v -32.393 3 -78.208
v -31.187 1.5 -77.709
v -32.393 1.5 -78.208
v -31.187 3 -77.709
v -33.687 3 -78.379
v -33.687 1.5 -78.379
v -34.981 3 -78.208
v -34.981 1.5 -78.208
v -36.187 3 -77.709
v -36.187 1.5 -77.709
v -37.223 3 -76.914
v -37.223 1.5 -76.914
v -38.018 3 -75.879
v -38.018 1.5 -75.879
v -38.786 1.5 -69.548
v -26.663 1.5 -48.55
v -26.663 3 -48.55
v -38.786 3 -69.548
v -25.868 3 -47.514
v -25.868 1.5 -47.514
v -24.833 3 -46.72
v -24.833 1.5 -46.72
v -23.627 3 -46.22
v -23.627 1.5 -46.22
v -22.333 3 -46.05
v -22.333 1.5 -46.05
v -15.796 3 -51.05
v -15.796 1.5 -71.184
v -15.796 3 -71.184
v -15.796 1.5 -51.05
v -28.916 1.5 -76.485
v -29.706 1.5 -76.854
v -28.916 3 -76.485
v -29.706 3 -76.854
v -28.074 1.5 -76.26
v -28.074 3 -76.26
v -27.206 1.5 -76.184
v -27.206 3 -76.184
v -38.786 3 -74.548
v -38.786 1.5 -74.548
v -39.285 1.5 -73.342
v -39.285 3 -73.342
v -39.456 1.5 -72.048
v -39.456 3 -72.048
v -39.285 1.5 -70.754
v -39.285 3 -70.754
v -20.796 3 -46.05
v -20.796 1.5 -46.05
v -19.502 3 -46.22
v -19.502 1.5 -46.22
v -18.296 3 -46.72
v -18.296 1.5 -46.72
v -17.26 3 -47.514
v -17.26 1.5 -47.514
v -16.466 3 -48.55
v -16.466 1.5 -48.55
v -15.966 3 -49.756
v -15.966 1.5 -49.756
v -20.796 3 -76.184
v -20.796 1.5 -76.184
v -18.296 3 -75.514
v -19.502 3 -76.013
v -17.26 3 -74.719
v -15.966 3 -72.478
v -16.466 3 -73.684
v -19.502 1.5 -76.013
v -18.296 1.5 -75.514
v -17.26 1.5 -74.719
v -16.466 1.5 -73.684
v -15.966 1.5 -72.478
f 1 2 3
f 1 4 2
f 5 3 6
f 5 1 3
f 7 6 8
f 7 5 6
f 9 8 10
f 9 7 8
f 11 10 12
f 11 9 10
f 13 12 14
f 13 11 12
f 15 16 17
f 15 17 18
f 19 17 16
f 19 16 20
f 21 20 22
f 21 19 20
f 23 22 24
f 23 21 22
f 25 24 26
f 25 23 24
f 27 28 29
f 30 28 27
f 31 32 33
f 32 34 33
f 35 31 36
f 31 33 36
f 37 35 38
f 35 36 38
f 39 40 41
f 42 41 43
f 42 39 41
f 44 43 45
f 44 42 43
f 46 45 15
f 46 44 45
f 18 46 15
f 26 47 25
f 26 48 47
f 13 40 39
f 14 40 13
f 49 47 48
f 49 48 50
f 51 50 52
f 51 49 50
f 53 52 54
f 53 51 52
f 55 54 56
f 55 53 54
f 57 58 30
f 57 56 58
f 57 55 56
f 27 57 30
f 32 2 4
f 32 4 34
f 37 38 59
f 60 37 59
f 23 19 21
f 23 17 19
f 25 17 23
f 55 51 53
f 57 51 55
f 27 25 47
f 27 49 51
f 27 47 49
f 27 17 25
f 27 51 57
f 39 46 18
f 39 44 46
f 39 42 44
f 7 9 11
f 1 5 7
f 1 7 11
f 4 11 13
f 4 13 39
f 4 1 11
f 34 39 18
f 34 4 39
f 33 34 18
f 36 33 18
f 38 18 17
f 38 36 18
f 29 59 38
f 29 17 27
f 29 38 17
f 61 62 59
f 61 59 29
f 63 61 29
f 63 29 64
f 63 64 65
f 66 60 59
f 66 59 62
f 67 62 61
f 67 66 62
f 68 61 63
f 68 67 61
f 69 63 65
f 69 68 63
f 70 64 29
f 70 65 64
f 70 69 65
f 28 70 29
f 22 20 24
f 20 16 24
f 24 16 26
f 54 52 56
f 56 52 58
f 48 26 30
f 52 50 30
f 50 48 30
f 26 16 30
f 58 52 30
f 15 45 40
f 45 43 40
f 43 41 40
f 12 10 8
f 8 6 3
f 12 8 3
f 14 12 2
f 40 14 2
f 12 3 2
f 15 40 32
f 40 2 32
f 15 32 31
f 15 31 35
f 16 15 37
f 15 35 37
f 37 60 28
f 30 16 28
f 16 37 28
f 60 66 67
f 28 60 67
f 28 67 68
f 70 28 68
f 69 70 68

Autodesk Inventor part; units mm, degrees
ref_plane "YZ Plane" through (0, 0, 0) normal (1, 0, 0) x (0, 1, 0)
ref_plane "XZ Plane" through (0, 0, 0) normal (0, 1, 0) x (-1, 0, 0)
ref_plane "XY Plane" through (0, 0, 0) normal (0, 0, 1) x (1, 0, 0)
sketch "スケッチ1" plane through (0, 0, 0) normal (0, 1, 0) x (-1, 0, 0)
  line L0 (75, 0) -> (105, -51.9615)
  line L1 (-75, 0) -> (-105, -51.9615)
  line L2 (0, -218.2384) -> (0, 36.3731)
  line L3 (147, 0) -> (-147, 0)
  line L4 (37.5, -27) -> (-37.5, -27)
  line L5 (105, -51.9615) -> (30, -181.8653)
  line L6 (30, -181.8653) -> (-30, -181.8653)
  line L7 (-30, -181.8653) -> (-105, -51.9615)
  line L8 (75, 0) -> (-75, 0)
  line L9 (-25.3673, -135.8894) -> (-62.8673, -70.9375)
  line L10 (25.3673, -135.8894) -> (62.8673, -70.9375)
  line L11 (-37.5, -27) -> (-27.5, -27)
  line L12 (-27.5, -27) -> (-27.5, -39)
  line L13 (-27.5, -39) -> (-37.5, -39)
  line L14 (-37.5, -39) -> (-37.5, -27)
  line L15 (37.5, -27) -> (27.5, -27)
  line L16 (27.5, -27) -> (27.5, -39)
  line L17 (27.5, -39) -> (37.5, -39)
  line L18 (37.5, -39) -> (37.5, -27)
  line L19 (0, -77.9423) -> (44.1173, -103.4134) construction
  line L20 (0, -77.9423) -> (-44.1173, -103.4134) construction
  line L21 (-44.1173, -103.4134) -> (-67.5, -116.9134) construction
  line L22 (-57.8673, -79.5977) -> (-47.475, -73.5977)
  line L23 (-52.475, -64.9375) -> (-62.8673, -70.9375)
  line L24 (-62.8673, -70.9375) -> (-57.8673, -79.5977)
  line L25 (-47.475, -73.5977) -> (-52.475, -64.9375)
  line L26 (-25.3673, -135.8894) -> (-30.3673, -127.2291)
  line L27 (-19.975, -121.2291) -> (-14.975, -129.8894)
  line L28 (-14.975, -129.8894) -> (-25.3673, -135.8894)
  line L29 (-30.3673, -127.2291) -> (-19.975, -121.2291)
  line L30 (30.3673, -127.2291) -> (19.975, -121.2291)
  line L31 (14.975, -129.8894) -> (25.3673, -135.8894)
  line L32 (25.3673, -135.8894) -> (30.3673, -127.2291)
  line L33 (19.975, -121.2291) -> (14.975, -129.8894)
  line L34 (62.8673, -70.9375) -> (57.8673, -79.5977)
  line L35 (47.475, -73.5977) -> (52.475, -64.9375)
  line L36 (52.475, -64.9375) -> (62.8673, -70.9375)
  line L37 (57.8673, -79.5977) -> (47.475, -73.5977)
  line L38 (62.8673, -70.9375) -> (37.5, -27)
  line L39 (-37.5, -27) -> (-62.8673, -70.9375)
  line L40 (-25.3673, -135.8894) -> (25.3673, -135.8894)
  line L41 (-25.3673, -135.8894) -> (-25.3673, -181.8653)
  line L42 (25.3673, -135.8894) -> (25.3673, -181.8653)
  line L43 (-25.3673, -135.8894) -> (-48.75, -149.3894)
  line L44 (25.3673, -135.8894) -> (48.75, -149.3894)
  point P0 (0, 0)
  point P1 (0, 0)
  point P2 (0, -27)
  dimension "d1" = 150
  dimension "d2" = 60
  dimension "d3" = 60
  dimension "d4" = 27
  dimension "d5" = 75
  dimension "d6" = 60
  dimension "d7" = 27
  dimension "d8" = 10
  dimension "d9" = 12
  dimension "d10" = 10
  dimension "d11" = 12
  dimension "d14" = 360
extrude "プレート1" add sketch "スケッチ1" along normal blind 1.5 contours L5 L6 L42 L44 | L4 L16 L17 L18 L38 L36 L35 L37 L10 L30 L33 L31 L40 L2 | L2 L40 L28 L27 L29 L9 L22 L25 L23 L39 L14 L13 L12 L4 | L31 L33 L30 L10 | L42 L6 L2 L40 | L2 L6 L41 L40 | L4 L18 L17 L16 | L12 L13 L14 L4 | L9 L29 L27 L28 | L41 L6 L7 L43 | L37 L35 L36 L10 | L23 L25 L22 L9
sketch "スケッチ2" plane through (0, 0, 0) normal (0, -1, 0) x (1, 0, 0)
  line L0 (23.3798, -38.55) -> (-23.3798, -38.55) projected
  line L1 (8.2, -46.6) -> (-8.2, -46.6) projected
  arc A0 (-21.1, -27) -> (-23.3798, -38.55) centre (-21.1, -33) ccw projected
  line L2 (-27.5, -27) -> (-27.5, -39) projected
  line L3 (27.5, -39) -> (27.5, -27) projected
  line L4 (-27.5, -39) -> (-27.5, -40.55)
  line L5 (-27.5, -40.55) -> (-10.2, -40.55)
  line L6 (-10.2, -40.55) -> (-10.2, -48.6)
  line L7 (-10.2, -48.6) -> (10.2, -48.6)
  line L8 (10.2, -48.6) -> (10.2, -40.55)
  line L9 (10.2, -40.55) -> (27.5, -40.55)
  line L10 (27.5, -40.55) -> (27.5, -39)
  line L11 (-37.5, -27) -> (-27.5, -27) projected
  line L12 (-37.5, -27) -> (37.5, -27) projected
  line L13 (-20.3112, -101.4469) -> (-30.5112, -83.78)
  line L14 (-27.2827, -105.4719) -> (-20.3112, -101.4469)
  line L15 (-18.6327, -120.4541) -> (-27.2827, -105.4719)
  line L16 (-19.975, -121.2291) -> (-18.6327, -120.4541)
  line L17 (-37.4827, -87.805) -> (-46.1327, -72.8227)
  line L18 (-46.1327, -72.8227) -> (-47.475, -73.5977)
  line L19 (-30.5112, -83.78) -> (-37.4827, -87.805)
  line L20 (30.5112, -83.78) -> (20.3112, -101.4469)
  line L21 (37.4827, -87.805) -> (30.5112, -83.78)
  line L22 (46.1327, -72.8227) -> (37.4827, -87.805)
  line L23 (47.475, -73.5977) -> (46.1327, -72.8227)
  line L24 (27.2827, -105.4719) -> (18.6327, -120.4541)
  line L25 (18.6327, -120.4541) -> (19.975, -121.2291)
  line L26 (20.3112, -101.4469) -> (27.2827, -105.4719)
  line L27 (-47.475, -73.5977) -> (-57.8673, -79.5977)
  line L28 (-57.8673, -79.5977) -> (-30.3673, -127.2291)
  line L29 (-30.3673, -127.2291) -> (-19.975, -121.2291)
  line L30 (19.975, -121.2291) -> (30.3673, -127.2291)
  line L31 (30.3673, -127.2291) -> (57.8673, -79.5977)
  line L32 (57.8673, -79.5977) -> (47.475, -73.5977)
  point P0 (0, 0)
  point P1 (0, -77.9423)
  point P2 (-23.0432, -100.7148)
  point P3 (-33.5673, -121.6866)
  point P4 (-22.4248, -117.8859)
  point P5 (-25.3673, -135.8894)
  point P6 (-28.3712, -118.6866)
  point P7 (-31.2432, -86.512)
  point P8 (-45.8046, -77.3909)
  point P9 (-62.8673, -70.9375)
  point P10 (31.2432, -86.512)
  point P11 (54.6673, -85.1403)
  point P12 (45.8046, -77.3909)
  point P13 (62.8673, -70.9375)
  point P14 (49.4712, -82.1403)
  point P15 (23.0432, -100.7148)
  point P16 (22.4248, -117.8859)
  point P17 (25.3673, -135.8894)
  dimension "d17" = 2
  dimension "d18" = 2
  dimension "d19" = 2
  dimension "d20" = 2
  dimension "d26" = 360
extrude "切り取り1" cut sketch "スケッチ2" against normal blind 1.5
fillet "フィレット1" radius 1.5 18 edges at (-10.2, 0.75, -48.6) (-10.2, 0.75, -40.55) (-27.5, 0.75, -40.55) (10.2, 0.75, -48.6) (10.2, 0.75, -40.55) (27.5, 0.75, -40.55) (-30.5112, 0.75, -83.78) (-46.1327, 0.75, -72.8227) (-20.3112, 0.75, -101.4469) (-27.2827, 0.75, -105.4719) (-37.4827, 0.75, -87.805) (-18.6327, 0.75, -120.4541) (20.3112, 0.75, -101.4469) (27.2827, 0.75, -105.4719) (18.6327, 0.75, -120.4541) (30.5112, 0.75, -83.78) (37.4827, 0.75, -87.805) (46.1327, 0.75, -72.8227)
sketch "スケッチ3" plane through (0, 0, 0) normal (0, -1, 0) x (1, 0, 0)
  circle A0 centre (40.9875, -45.0405) radius 1.6 projected
  circle A1 centre (48.9875, -58.8969) radius 1.6 projected
  circle A2 centre (8, -129.8894) radius 1.6 projected
  circle A3 centre (-8, -129.8894) radius 1.6 projected
  circle A4 centre (-48.9875, -58.8969) radius 1.6 projected
  circle A5 centre (-40.9875, -45.0405) radius 1.6 projected
  point P0 (0, 0)
extrude "切り取り2" cut sketch "スケッチ3" against normal blind 1.5
sketch "スケッチ4" plane through (0, 0, 0) normal (0, -1, 0) x (1, 0, 0)
  circle A0 centre (10, -176.8653) radius 1.35 projected
  circle A1 centre (21.2333, -145.0496) radius 1.6 projected
  circle A2 centre (10, -143.8894) radius 1.6 projected
  line L0 (52.75, -142.4612) -> (30, -181.8653) projected
  line L1 (52.75, -142.4612) -> (33.6974, -131.4612) projected
  line L2 (33.6974, -131.4612) -> (27.1974, -142.7195) projected
  line L3 (27.1974, -142.7195) -> (20.5635, -138.8894) projected
  line L4 (20.5635, -138.8894) -> (5, -138.8894) projected
  line L5 (5, -138.8894) -> (5, -181.8653) projected
  line L6 (30, -181.8653) -> (5, -181.8653) projected
  circle A3 centre (-10, -176.8653) radius 1.35 projected
  circle A4 centre (-21.2333, -145.0496) radius 1.6 projected
  circle A5 centre (-10, -143.8894) radius 1.6 projected
  line L7 (-12.9295, -171.4323) -> (-35.4295, -132.4612) projected
  line L8 (-30.25, -181.4323) -> (-12.9295, -171.4323) projected
  line L9 (-30, -181.8653) -> (-30.25, -181.4323) projected
  line L10 (-30, -181.8653) -> (-5, -181.8653) projected
  line L11 (-5, -181.8653) -> (-5, -138.8894) projected
  line L12 (-5, -138.8894) -> (-20.5635, -138.8894) projected
  line L13 (-20.5635, -138.8894) -> (-27.1974, -142.7195) projected
  line L14 (-33.6974, -131.4612) -> (-27.1974, -142.7195) projected
  line L15 (-35.4295, -132.4612) -> (-33.6974, -131.4612) projected
  point P0 (0, 0)
extrude "切り取り3" cut sketch "スケッチ4" against normal blind 1.5 contours A0 | A1 | A2 | A3 | A4 | A5
sketch "スケッチ5" plane through (0, 1.5, 0) normal (0, 1, 0) x (1, 0, 0)
  line L0 (-19.975, 121.2291) -> (19.975, 121.2291) projected
  line L1 (47.475, 73.5977) -> (27.5, 39) projected
  line L2 (-47.475, 73.5977) -> (-27.5, 39) projected
  point P0 (0, 0)
sketch "スケッチ6" plane through (0, 1.5, 0) normal (0, 1, 0) x (1, 0, 0)
  line L0 (-26.0855, 44.55) -> (-41.9613, 72.0477)
  line L1 (-41.9613, 72.0477) -> (-36.0186, 82.3409)
  line L2 (-36.0186, 82.3409) -> (-29.0471, 78.3159)
  line L3 (-29.0471, 78.3159) -> (-14.8471, 102.911)
  line L4 (-14.8471, 102.911) -> (-21.8186, 106.936)
  line L5 (-21.8186, 106.936) -> (-15.8758, 117.2291)
  line L6 (-15.8758, 117.2291) -> (15.8758, 117.2291)
  line L7 (15.8758, 117.2291) -> (21.8186, 106.936)
  line L8 (21.8186, 106.936) -> (14.8471, 102.911)
  line L9 (14.8471, 102.911) -> (29.0471, 78.3159)
  line L10 (29.0471, 78.3159) -> (36.0186, 82.3409)
  line L11 (36.0186, 82.3409) -> (41.9613, 72.0477)
  line L12 (41.9613, 72.0477) -> (26.0855, 44.55)
  line L13 (26.0855, 44.55) -> (14.2, 44.55)
  line L14 (14.2, 44.55) -> (14.2, 52.6)
  line L15 (14.2, 52.6) -> (-14.2, 52.6)
  line L16 (-14.2, 52.6) -> (-14.2, 44.55)
  line L17 (-14.2, 44.55) -> (-26.0855, 44.55)
  line L18 (-47.475, 73.5977) -> (-27.5, 39) projected
  line L19 (-38.2327, 86.5059) -> (-45.3827, 74.1218) projected
  line L20 (-31.8102, 84.53) -> (-36.1836, 87.055) projected
  line L21 (-21.0612, 100.1479) -> (-29.7612, 85.079) projected
  line L22 (-25.9836, 104.7219) -> (-21.6102, 102.1969) projected
  line L23 (-19.3827, 119.1551) -> (-26.5327, 106.7709) projected
  line L24 (-19.975, 121.2291) -> (19.975, 121.2291) projected
  line L25 (47.475, 73.5977) -> (27.5, 39) projected
  line L26 (26.5327, 106.7709) -> (19.3827, 119.1551) projected
  line L27 (21.6102, 102.1969) -> (25.9836, 104.7219) projected
  line L28 (29.7612, 85.079) -> (21.0612, 100.1479) projected
  line L29 (36.1836, 87.055) -> (31.8102, 84.53) projected
  line L30 (45.3827, 74.1218) -> (38.2327, 86.5059) projected
  line L31 (11.7, 40.55) -> (26, 40.55) projected
  line L32 (10.2, 47.1) -> (10.2, 42.05) projected
  line L33 (-8.7, 48.6) -> (8.7, 48.6) projected
  line L34 (-10.2, 42.05) -> (-10.2, 47.1) projected
  line L35 (-26, 40.55) -> (-11.7, 40.55) projected
  line L36 (0, 48.6) -> (0, 121.2291)
  line L37 (-25.4112, 92.6134) -> (-31.0836, 95.8884) construction
  point P0 (0, 0)
  dimension "d32" = 4
  dimension "d33" = 4
  dimension "d34" = 4
  dimension "d35" = 4
  dimension "d36" = 4
  dimension "d37" = 4
  dimension "d38" = 4
  dimension "d39" = 4
  dimension "d40" = 4
extrude "切り取り4" cut sketch "スケッチ6" against normal blind 1.5
fillet "フィレット2" radius 5 9 edges at (-14.2, 0.75, -44.55) (-26.0855, 0.75, -44.55) (-41.9613, 0.75, -72.0477) (-36.0186, 0.75, -82.3409) (-21.8186, 0.75, -106.936) (-15.8758, 0.75, -117.2291) (-14.2, 0.75, -52.6) (-29.0471, 0.75, -78.3159) (-14.8471, 0.75, -102.911)
mirror "ミラー1" about plane through (0, 0, 0) normal (1, 0, 0) of "フィレット2"
sketch "スケッチ7" plane through (0, 1.5, 0) normal (0, 1, 0) x (1, 0, 0)
  arc A0 (18.2848, 105.0066) -> (17.2511, 98.7471) centre (21.5812, 101.2471) ccw projected
  line L0 (17.2511, 98.7471) -> (26.643, 82.4797) projected
  arc A1 (26.643, 82.4797) -> (32.5808, 80.2452) centre (30.9732, 84.9797) ccw projected
  arc A2 (38.5186, 78.0107) -> (32.5808, 80.2452) centre (34.1884, 75.5107) ccw projected
  line L1 (38.5186, 78.0107) -> (40.5179, 74.5477) projected
  arc A3 (40.5179, 69.5477) -> (40.5179, 74.5477) centre (36.1878, 72.0477) ccw projected
  line L2 (40.5179, 69.5477) -> (27.5289, 47.05) projected
  arc A4 (23.1987, 44.55) -> (27.5289, 47.05) centre (23.1987, 49.55) ccw projected
  line L3 (23.1987, 44.55) -> (19.2, 44.55) projected
  arc A5 (14.296, 48.575) -> (19.2, 44.55) centre (19.2, 49.55) ccw projected
  arc A6 (14.296, 48.575) -> (9.392, 52.6) centre (9.392, 47.6) ccw projected
  line L4 (9.392, 52.6) -> (-9.392, 52.6) projected
  arc A7 (-9.392, 52.6) -> (-14.296, 48.575) centre (-9.392, 47.6) ccw projected
  arc A8 (-19.2, 44.55) -> (-14.296, 48.575) centre (-19.2, 49.55) ccw projected
  line L5 (-19.2, 44.55) -> (-23.1987, 44.55) projected
  arc A9 (-27.5289, 47.05) -> (-23.1987, 44.55) centre (-23.1987, 49.55) ccw projected
  line L6 (-27.5289, 47.05) -> (-40.5179, 69.5477) projected
  arc A10 (-40.5179, 74.5477) -> (-40.5179, 69.5477) centre (-36.1878, 72.0477) ccw projected
  line L7 (-40.5179, 74.5477) -> (-38.5186, 78.0107) projected
  arc A11 (-32.5808, 80.2452) -> (-38.5186, 78.0107) centre (-34.1884, 75.5107) ccw projected
  arc A12 (-32.5808, 80.2452) -> (-26.643, 82.4797) centre (-30.9732, 84.9797) ccw projected
  line L8 (-26.643, 82.4797) -> (-17.2511, 98.7471) projected
  arc A13 (-17.2511, 98.7471) -> (-18.2848, 105.0066) centre (-21.5812, 101.2471) ccw projected
  arc A14 (-19.3186, 111.2661) -> (-18.2848, 105.0066) centre (-14.9884, 108.7661) ccw projected
  line L9 (-19.3186, 111.2661) -> (-17.3192, 114.7291) projected
  arc A15 (-12.9891, 117.2291) -> (-17.3192, 114.7291) centre (-12.9891, 112.2291) ccw projected
  line L10 (-12.9891, 117.2291) -> (12.9891, 117.2291) projected
  arc A16 (17.3192, 114.7291) -> (12.9891, 117.2291) centre (12.9891, 112.2291) ccw projected
  line L11 (17.3192, 114.7291) -> (19.3186, 111.2661) projected
  arc A17 (18.2848, 105.0066) -> (19.3186, 111.2661) centre (14.9884, 108.7661) ccw projected
  circle A18 centre (21.2333, 145.0496) radius 1.6 projected
  circle A19 centre (-10, 143.8894) radius 1.6 projected
  circle A20 centre (-10, 176.8653) radius 1.35 projected
  circle A21 centre (-21.2333, 145.0496) radius 1.6 projected
  circle A22 centre (10, 176.8653) radius 1.35 projected
  circle A23 centre (10, 143.8894) radius 1.6 projected
  circle A24 centre (-48.9875, 58.8969) radius 1.6 projected
  circle A25 centre (8, 129.8894) radius 1.6 projected
  circle A26 centre (40.9875, 45.0405) radius 1.6 projected
  circle A27 centre (48.9875, 58.8969) radius 1.6 projected
  circle A28 centre (-8, 129.8894) radius 1.6 projected
  circle A29 centre (-40.9875, 45.0405) radius 1.6 projected
  arc A30 (38.2327, 86.5059) -> (36.1836, 87.055) centre (36.9336, 85.7559) ccw projected
  line L12 (36.1836, 87.055) -> (31.8102, 84.53) projected
  arc A31 (29.7612, 85.079) -> (31.8102, 84.53) centre (31.0602, 85.829) ccw projected
  line L13 (29.7612, 85.079) -> (21.0612, 100.1479) projected
  arc A32 (21.6102, 102.1969) -> (21.0612, 100.1479) centre (22.3602, 100.8979) ccw projected
  line L14 (21.6102, 102.1969) -> (25.9836, 104.7219) projected
  arc A33 (25.9836, 104.7219) -> (26.5327, 106.7709) centre (25.2336, 106.0209) ccw projected
  line L15 (26.5327, 106.7709) -> (19.3827, 119.1551) projected
  arc A34 (19.9317, 121.2041) -> (19.3827, 119.1551) centre (20.6817, 119.9051) ccw projected
  line L16 (19.9317, 121.2041) -> (30.3673, 127.2291) projected
  line L17 (25.3673, 135.8894) -> (30.3673, 127.2291) projected
  line L18 (48.75, 149.3894) -> (25.3673, 135.8894) projected
  line L19 (30, 181.8653) -> (48.75, 149.3894) projected
  line L20 (-30, 181.8653) -> (30, 181.8653) projected
  line L21 (-48.75, 149.3894) -> (-30, 181.8653) projected
  line L22 (-25.3673, 135.8894) -> (-48.75, 149.3894) projected
  line L23 (-30.3673, 127.2291) -> (-25.3673, 135.8894) projected
  line L24 (-30.3673, 127.2291) -> (-19.9317, 121.2041) projected
  arc A35 (-19.3827, 119.1551) -> (-19.9317, 121.2041) centre (-20.6817, 119.9051) ccw projected
  line L25 (-19.3827, 119.1551) -> (-26.5327, 106.7709) projected
  arc A36 (-26.5327, 106.7709) -> (-25.9836, 104.7219) centre (-25.2336, 106.0209) ccw projected
  line L26 (-25.9836, 104.7219) -> (-21.6102, 102.1969) projected
  arc A37 (-21.0612, 100.1479) -> (-21.6102, 102.1969) centre (-22.3602, 100.8979) ccw projected
  line L27 (-21.0612, 100.1479) -> (-29.7612, 85.079) projected
  arc A38 (-31.8102, 84.53) -> (-29.7612, 85.079) centre (-31.0602, 85.829) ccw projected
  line L28 (-31.8102, 84.53) -> (-36.1836, 87.055) projected
  arc A39 (-36.1836, 87.055) -> (-38.2327, 86.5059) centre (-36.9336, 85.7559) ccw projected
  line L29 (-38.2327, 86.5059) -> (-45.3827, 74.1218) projected
  arc A40 (-47.4317, 73.5727) -> (-45.3827, 74.1218) centre (-46.6817, 74.8718) ccw projected
  line L30 (-47.4317, 73.5727) -> (-57.8673, 79.5977) projected
  line L31 (-62.8673, 70.9375) -> (-57.8673, 79.5977) projected
  line L32 (-37.5, 27) -> (-62.8673, 70.9375) projected
  line L33 (-27.5, 27) -> (-37.5, 27) projected
  line L34 (-27.5, 27) -> (-27.5, 39.05) projected
  arc A41 (-26, 40.55) -> (-27.5, 39.05) centre (-26, 39.05) ccw projected
  line L35 (-26, 40.55) -> (-11.7, 40.55) projected
  arc A42 (-11.7, 40.55) -> (-10.2, 42.05) centre (-11.7, 42.05) ccw projected
  line L36 (-10.2, 42.05) -> (-10.2, 47.1) projected
  arc A43 (-8.7, 48.6) -> (-10.2, 47.1) centre (-8.7, 47.1) ccw projected
  line L37 (-8.7, 48.6) -> (8.7, 48.6) projected
  arc A44 (10.2, 47.1) -> (8.7, 48.6) centre (8.7, 47.1) ccw projected
  line L38 (10.2, 47.1) -> (10.2, 42.05) projected
  arc A45 (10.2, 42.05) -> (11.7, 40.55) centre (11.7, 42.05) ccw projected
  line L39 (11.7, 40.55) -> (26, 40.55) projected
  arc A46 (27.5, 39.05) -> (26, 40.55) centre (26, 39.05) ccw projected
  line L40 (27.5, 39.05) -> (27.5, 27) projected
  line L41 (37.5, 27) -> (27.5, 27) projected
  line L42 (62.8673, 70.9375) -> (37.5, 27) projected
  line L43 (57.8673, 79.5977) -> (62.8673, 70.9375) projected
  line L44 (57.8673, 79.5977) -> (47.4317, 73.5727) projected
  arc A47 (45.3827, 74.1218) -> (47.4317, 73.5727) centre (46.6817, 74.8718) ccw projected
  line L45 (45.3827, 74.1218) -> (38.2327, 86.5059) projected
  line L46 (25.2195, 46.05) -> (15.796, 46.05)
  line L47 (15.796, 46.05) -> (15.796, 54.1)
  line L48 (15.796, 54.1) -> (-15.796, 54.1)
  line L49 (-15.796, 54.1) -> (-15.796, 46.05)
  line L50 (-15.796, 46.05) -> (-25.2195, 46.05)
  line L51 (-25.2195, 46.05) -> (-40.2293, 72.0477)
  line L52 (-40.2293, 72.0477) -> (-35.5175, 80.2087)
  line L53 (-35.5175, 80.2087) -> (-28.546, 76.1837)
  line L54 (-28.546, 76.1837) -> (-12.75, 103.5432)
  line L55 (-12.75, 103.5432) -> (-19.7215, 107.5682)
  line L56 (-19.7215, 107.5682) -> (-15.0098, 115.7291)
  line L57 (-15.0098, 115.7291) -> (15.0098, 115.7291)
  line L58 (15.0098, 115.7291) -> (19.7215, 107.5682)
  line L59 (19.7215, 107.5682) -> (12.75, 103.5432)
  line L60 (12.75, 103.5432) -> (28.546, 76.1837)
  line L61 (28.546, 76.1837) -> (35.5175, 80.2087)
  line L62 (35.5175, 80.2087) -> (40.2293, 72.0477)
  line L63 (40.2293, 72.0477) -> (25.2195, 46.05)
  line L64 (0, 54.1) -> (0, 115.7291) construction
  line L65 (0, 218.2384) -> (0, -36.3731) construction
  line L66 (40.5179, 69.5477) -> (27.5289, 47.05) projected
  line L67 (20.648, 89.8634) -> (0, 77.9423) construction
  line L68 (0, 54.1) -> (0, 77.9423) construction
  line L69 (17.3192, 114.7291) -> (19.3186, 111.2661) projected
  point P0 (0, 0)
  dimension "d44" = 1.5
  dimension "d45" = 1.5
  dimension "d46" = 1.5
  dimension "d47" = 1.5
  dimension "d48" = 1.5
  dimension "d49" = 1.5
  dimension "d50" = 1.5
  dimension "d51" = 1.5
extrude "押し出し1" cut sketch "スケッチ7" against normal through all contours A0 L0 A1 A2 L1 A3 L2 A4 L3 A5 A6 L4 A7 A8 L5 A9 L6 A10 L7 A11 A12 L8 A13 A14 L9 A15 L10 A16 L11 A17 | L45 A47 L44 L43 L42 L41 L40 A46 L39 A45 L38 A44 L37 A43 L36 A42 L35 A41 L34 L33 L32 L31 L30 A40 L29 A39 L28 A38 L27 A37 L26 A36 L25 A35 L24 L23 L22 L21 L20 L19 L18 L17 L16 A34 L15 A33 L14 A32 L13 A31 L12 A30 | L46 L47 L48 L49 L50 L51 L52 L53 L54 L55 L56 L57 L58 L59 L60 L61 L62 L63
extrude "押し出し2" add sketch "スケッチ7" along normal blind 1.5 contours L46 L47 L48 L49 L50 L51 L52 L53 L54 L55 L56 L57 L58 L59 L60 L61 L62 L63
sketch "スケッチ8" plane through (0, 3, 0) normal (0, 1, 0) x (1, 0, 0)
  line L0 (15, 59.1) -> (-15, 59.1)
  line L1 (-15, 59.1) -> (-15, 124.1)
  line L2 (-15, 124.1) -> (15, 124.1)
  line L3 (15, 124.1) -> (15, 59.1)
  line L4 (-15.796, 54.1) -> (15.796, 54.1) projected
  line L5 (15.0098, 115.7291) -> (-15.0098, 115.7291) projected
  line L6 (15, 59.1) -> (15, 54.1)
  line L7 (-15.796, 46.05) -> (-15.796, 54.1) projected
  line L8 (-25.2195, 46.05) -> (-15.796, 46.05) projected
  line L9 (-40.2293, 72.0477) -> (-25.2195, 46.05) projected
  line L10 (-35.5175, 80.2087) -> (-40.2293, 72.0477) projected
  line L11 (-28.546, 76.1837) -> (-35.5175, 80.2087) projected
  line L12 (-12.75, 103.5432) -> (-28.546, 76.1837) projected
  line L13 (-19.7215, 107.5682) -> (-12.75, 103.5432) projected
  line L14 (-15.0098, 115.7291) -> (-19.7215, 107.5682) projected
  line L15 (15.796, 54.1) -> (15.796, 114.3674)
  line L16 (19.7215, 107.5682) -> (15.0098, 115.7291) projected
  line L17 (12.75, 103.5432) -> (19.7215, 107.5682) projected
  line L18 (-15.796, 54.1) -> (-15.796, 98.2674)
  line L19 (40.2293, 72.0477) -> (35.5175, 80.2087) projected
  line L20 (35.5175, 80.2087) -> (28.546, 76.1837) projected
  line L21 (28.546, 76.1837) -> (12.75, 103.5432) projected
  line L22 (12.75, 103.5432) -> (19.7215, 107.5682) projected
  line L23 (19.7215, 107.5682) -> (15.0098, 115.7291) projected
  line L24 (15.0098, 115.7291) -> (-15.0098, 115.7291) projected
  line L25 (-15.0098, 115.7291) -> (-19.7215, 107.5682) projected
  line L26 (-19.7215, 107.5682) -> (-12.75, 103.5432) projected
  line L27 (-12.75, 103.5432) -> (-28.546, 76.1837) projected
  line L28 (-28.546, 76.1837) -> (-35.5175, 80.2087) projected
  line L29 (-35.5175, 80.2087) -> (-40.2293, 72.0477) projected
  line L30 (-40.2293, 72.0477) -> (-25.2195, 46.05) projected
  line L31 (-25.2195, 46.05) -> (-15.796, 46.05) projected
  line L32 (-15.796, 46.05) -> (-15.796, 54.1) projected
  line L33 (-15.796, 54.1) -> (15.796, 54.1) projected
  line L34 (15.796, 54.1) -> (15.796, 46.05) projected
  line L35 (15.796, 46.05) -> (25.2195, 46.05) projected
  line L36 (25.2195, 46.05) -> (40.2293, 72.0477) projected
  line L37 (-28.546, 76.1837) -> (-15.796, 76.1837)
  point P0 (0, 0)
  point P1 (0, 59.1)
  point P2 (0, 54.1)
  point P3 (-15, 115.7291)
  point P4 (15, 115.7291)
  point P5 (-15, 104.8422)
  point P6 (-15, 99.6461)
  point P7 (15.796, 105.3017)
  point P8 (15.796, 98.2674)
  dimension "d56" = 65
  dimension "d57" = 30
  dimension "d58" = 5
extrude "押し出し3" cut sketch "スケッチ8" against normal through all contours L6 L4 L18 L12 L1 L0 | L0 L1 L12 L13 L5 L3 L17 L21 | L3 L21 L15 L4 L6 | L21 L17 L3 | L3 L17 L15 L21 | L1 L13 L12 | L3 L5 L16 L15 L17 | L21 L20 L19 L36 L35 L34 L15 | L13 L14 L5 L1 | L18 L37 L12 | L5 L1 L2 L3 | L15 L16 L17
fillet "フィレット4" radius 5 6 edges at (-15.796, 2.25, -46.05) (-25.2195, 2.25, -46.05) (-40.2293, 2.25, -72.0477) (-35.5175, 2.25, -80.2087) (-28.546, 2.25, -76.1837) (-15.796, 2.25, -76.1837)
equation "\"d3\" = d2"
equation "\"d7\" = d4"
equation "\"d19\" = d18"
equation "\"d21\" = Thickness"
equation "\"d28\" = Thickness"
equation "\"d30\" = Thickness"
equation "\"d33\" = d32"
equation "\"d34\" = d32"
equation "\"d35\" = d32"
equation "\"d36\" = d32"
equation "\"d37\" = d32"
equation "\"d38\" = d32"
equation "\"d39\" = d32"
equation "\"d40\" = d32"
equation "\"d41\" = Thickness"
equation "\"d45\" = d44"
equation "\"d46\" = d44"
equation "\"d47\" = d44"
equation "\"d48\" = d44"
equation "\"d49\" = d44"
equation "\"d50\" = d44"
equation "\"d51\" = d44"
equation "\"d16\" = Thickness"
equation "\"BendRadius\" = Thickness"
equation "\"BendReliefWidth\" = Thickness"
equation "\"BendReliefDepth\" = 0.5 * Thickness"
equation "\"CornerReliefSize\" = 4 * Thickness"
equation "\"MinimumRemnant\" = 2 * Thickness"
equation "\"TransitionRadius\" = BendRadius"
equation "\"JacobiRadiusSize\" = BendRadius"
equation "\"GapSize\" = Thickness"
equation "\"Thickness\" = 1.5"
properties part number "CORE_hat_right"
